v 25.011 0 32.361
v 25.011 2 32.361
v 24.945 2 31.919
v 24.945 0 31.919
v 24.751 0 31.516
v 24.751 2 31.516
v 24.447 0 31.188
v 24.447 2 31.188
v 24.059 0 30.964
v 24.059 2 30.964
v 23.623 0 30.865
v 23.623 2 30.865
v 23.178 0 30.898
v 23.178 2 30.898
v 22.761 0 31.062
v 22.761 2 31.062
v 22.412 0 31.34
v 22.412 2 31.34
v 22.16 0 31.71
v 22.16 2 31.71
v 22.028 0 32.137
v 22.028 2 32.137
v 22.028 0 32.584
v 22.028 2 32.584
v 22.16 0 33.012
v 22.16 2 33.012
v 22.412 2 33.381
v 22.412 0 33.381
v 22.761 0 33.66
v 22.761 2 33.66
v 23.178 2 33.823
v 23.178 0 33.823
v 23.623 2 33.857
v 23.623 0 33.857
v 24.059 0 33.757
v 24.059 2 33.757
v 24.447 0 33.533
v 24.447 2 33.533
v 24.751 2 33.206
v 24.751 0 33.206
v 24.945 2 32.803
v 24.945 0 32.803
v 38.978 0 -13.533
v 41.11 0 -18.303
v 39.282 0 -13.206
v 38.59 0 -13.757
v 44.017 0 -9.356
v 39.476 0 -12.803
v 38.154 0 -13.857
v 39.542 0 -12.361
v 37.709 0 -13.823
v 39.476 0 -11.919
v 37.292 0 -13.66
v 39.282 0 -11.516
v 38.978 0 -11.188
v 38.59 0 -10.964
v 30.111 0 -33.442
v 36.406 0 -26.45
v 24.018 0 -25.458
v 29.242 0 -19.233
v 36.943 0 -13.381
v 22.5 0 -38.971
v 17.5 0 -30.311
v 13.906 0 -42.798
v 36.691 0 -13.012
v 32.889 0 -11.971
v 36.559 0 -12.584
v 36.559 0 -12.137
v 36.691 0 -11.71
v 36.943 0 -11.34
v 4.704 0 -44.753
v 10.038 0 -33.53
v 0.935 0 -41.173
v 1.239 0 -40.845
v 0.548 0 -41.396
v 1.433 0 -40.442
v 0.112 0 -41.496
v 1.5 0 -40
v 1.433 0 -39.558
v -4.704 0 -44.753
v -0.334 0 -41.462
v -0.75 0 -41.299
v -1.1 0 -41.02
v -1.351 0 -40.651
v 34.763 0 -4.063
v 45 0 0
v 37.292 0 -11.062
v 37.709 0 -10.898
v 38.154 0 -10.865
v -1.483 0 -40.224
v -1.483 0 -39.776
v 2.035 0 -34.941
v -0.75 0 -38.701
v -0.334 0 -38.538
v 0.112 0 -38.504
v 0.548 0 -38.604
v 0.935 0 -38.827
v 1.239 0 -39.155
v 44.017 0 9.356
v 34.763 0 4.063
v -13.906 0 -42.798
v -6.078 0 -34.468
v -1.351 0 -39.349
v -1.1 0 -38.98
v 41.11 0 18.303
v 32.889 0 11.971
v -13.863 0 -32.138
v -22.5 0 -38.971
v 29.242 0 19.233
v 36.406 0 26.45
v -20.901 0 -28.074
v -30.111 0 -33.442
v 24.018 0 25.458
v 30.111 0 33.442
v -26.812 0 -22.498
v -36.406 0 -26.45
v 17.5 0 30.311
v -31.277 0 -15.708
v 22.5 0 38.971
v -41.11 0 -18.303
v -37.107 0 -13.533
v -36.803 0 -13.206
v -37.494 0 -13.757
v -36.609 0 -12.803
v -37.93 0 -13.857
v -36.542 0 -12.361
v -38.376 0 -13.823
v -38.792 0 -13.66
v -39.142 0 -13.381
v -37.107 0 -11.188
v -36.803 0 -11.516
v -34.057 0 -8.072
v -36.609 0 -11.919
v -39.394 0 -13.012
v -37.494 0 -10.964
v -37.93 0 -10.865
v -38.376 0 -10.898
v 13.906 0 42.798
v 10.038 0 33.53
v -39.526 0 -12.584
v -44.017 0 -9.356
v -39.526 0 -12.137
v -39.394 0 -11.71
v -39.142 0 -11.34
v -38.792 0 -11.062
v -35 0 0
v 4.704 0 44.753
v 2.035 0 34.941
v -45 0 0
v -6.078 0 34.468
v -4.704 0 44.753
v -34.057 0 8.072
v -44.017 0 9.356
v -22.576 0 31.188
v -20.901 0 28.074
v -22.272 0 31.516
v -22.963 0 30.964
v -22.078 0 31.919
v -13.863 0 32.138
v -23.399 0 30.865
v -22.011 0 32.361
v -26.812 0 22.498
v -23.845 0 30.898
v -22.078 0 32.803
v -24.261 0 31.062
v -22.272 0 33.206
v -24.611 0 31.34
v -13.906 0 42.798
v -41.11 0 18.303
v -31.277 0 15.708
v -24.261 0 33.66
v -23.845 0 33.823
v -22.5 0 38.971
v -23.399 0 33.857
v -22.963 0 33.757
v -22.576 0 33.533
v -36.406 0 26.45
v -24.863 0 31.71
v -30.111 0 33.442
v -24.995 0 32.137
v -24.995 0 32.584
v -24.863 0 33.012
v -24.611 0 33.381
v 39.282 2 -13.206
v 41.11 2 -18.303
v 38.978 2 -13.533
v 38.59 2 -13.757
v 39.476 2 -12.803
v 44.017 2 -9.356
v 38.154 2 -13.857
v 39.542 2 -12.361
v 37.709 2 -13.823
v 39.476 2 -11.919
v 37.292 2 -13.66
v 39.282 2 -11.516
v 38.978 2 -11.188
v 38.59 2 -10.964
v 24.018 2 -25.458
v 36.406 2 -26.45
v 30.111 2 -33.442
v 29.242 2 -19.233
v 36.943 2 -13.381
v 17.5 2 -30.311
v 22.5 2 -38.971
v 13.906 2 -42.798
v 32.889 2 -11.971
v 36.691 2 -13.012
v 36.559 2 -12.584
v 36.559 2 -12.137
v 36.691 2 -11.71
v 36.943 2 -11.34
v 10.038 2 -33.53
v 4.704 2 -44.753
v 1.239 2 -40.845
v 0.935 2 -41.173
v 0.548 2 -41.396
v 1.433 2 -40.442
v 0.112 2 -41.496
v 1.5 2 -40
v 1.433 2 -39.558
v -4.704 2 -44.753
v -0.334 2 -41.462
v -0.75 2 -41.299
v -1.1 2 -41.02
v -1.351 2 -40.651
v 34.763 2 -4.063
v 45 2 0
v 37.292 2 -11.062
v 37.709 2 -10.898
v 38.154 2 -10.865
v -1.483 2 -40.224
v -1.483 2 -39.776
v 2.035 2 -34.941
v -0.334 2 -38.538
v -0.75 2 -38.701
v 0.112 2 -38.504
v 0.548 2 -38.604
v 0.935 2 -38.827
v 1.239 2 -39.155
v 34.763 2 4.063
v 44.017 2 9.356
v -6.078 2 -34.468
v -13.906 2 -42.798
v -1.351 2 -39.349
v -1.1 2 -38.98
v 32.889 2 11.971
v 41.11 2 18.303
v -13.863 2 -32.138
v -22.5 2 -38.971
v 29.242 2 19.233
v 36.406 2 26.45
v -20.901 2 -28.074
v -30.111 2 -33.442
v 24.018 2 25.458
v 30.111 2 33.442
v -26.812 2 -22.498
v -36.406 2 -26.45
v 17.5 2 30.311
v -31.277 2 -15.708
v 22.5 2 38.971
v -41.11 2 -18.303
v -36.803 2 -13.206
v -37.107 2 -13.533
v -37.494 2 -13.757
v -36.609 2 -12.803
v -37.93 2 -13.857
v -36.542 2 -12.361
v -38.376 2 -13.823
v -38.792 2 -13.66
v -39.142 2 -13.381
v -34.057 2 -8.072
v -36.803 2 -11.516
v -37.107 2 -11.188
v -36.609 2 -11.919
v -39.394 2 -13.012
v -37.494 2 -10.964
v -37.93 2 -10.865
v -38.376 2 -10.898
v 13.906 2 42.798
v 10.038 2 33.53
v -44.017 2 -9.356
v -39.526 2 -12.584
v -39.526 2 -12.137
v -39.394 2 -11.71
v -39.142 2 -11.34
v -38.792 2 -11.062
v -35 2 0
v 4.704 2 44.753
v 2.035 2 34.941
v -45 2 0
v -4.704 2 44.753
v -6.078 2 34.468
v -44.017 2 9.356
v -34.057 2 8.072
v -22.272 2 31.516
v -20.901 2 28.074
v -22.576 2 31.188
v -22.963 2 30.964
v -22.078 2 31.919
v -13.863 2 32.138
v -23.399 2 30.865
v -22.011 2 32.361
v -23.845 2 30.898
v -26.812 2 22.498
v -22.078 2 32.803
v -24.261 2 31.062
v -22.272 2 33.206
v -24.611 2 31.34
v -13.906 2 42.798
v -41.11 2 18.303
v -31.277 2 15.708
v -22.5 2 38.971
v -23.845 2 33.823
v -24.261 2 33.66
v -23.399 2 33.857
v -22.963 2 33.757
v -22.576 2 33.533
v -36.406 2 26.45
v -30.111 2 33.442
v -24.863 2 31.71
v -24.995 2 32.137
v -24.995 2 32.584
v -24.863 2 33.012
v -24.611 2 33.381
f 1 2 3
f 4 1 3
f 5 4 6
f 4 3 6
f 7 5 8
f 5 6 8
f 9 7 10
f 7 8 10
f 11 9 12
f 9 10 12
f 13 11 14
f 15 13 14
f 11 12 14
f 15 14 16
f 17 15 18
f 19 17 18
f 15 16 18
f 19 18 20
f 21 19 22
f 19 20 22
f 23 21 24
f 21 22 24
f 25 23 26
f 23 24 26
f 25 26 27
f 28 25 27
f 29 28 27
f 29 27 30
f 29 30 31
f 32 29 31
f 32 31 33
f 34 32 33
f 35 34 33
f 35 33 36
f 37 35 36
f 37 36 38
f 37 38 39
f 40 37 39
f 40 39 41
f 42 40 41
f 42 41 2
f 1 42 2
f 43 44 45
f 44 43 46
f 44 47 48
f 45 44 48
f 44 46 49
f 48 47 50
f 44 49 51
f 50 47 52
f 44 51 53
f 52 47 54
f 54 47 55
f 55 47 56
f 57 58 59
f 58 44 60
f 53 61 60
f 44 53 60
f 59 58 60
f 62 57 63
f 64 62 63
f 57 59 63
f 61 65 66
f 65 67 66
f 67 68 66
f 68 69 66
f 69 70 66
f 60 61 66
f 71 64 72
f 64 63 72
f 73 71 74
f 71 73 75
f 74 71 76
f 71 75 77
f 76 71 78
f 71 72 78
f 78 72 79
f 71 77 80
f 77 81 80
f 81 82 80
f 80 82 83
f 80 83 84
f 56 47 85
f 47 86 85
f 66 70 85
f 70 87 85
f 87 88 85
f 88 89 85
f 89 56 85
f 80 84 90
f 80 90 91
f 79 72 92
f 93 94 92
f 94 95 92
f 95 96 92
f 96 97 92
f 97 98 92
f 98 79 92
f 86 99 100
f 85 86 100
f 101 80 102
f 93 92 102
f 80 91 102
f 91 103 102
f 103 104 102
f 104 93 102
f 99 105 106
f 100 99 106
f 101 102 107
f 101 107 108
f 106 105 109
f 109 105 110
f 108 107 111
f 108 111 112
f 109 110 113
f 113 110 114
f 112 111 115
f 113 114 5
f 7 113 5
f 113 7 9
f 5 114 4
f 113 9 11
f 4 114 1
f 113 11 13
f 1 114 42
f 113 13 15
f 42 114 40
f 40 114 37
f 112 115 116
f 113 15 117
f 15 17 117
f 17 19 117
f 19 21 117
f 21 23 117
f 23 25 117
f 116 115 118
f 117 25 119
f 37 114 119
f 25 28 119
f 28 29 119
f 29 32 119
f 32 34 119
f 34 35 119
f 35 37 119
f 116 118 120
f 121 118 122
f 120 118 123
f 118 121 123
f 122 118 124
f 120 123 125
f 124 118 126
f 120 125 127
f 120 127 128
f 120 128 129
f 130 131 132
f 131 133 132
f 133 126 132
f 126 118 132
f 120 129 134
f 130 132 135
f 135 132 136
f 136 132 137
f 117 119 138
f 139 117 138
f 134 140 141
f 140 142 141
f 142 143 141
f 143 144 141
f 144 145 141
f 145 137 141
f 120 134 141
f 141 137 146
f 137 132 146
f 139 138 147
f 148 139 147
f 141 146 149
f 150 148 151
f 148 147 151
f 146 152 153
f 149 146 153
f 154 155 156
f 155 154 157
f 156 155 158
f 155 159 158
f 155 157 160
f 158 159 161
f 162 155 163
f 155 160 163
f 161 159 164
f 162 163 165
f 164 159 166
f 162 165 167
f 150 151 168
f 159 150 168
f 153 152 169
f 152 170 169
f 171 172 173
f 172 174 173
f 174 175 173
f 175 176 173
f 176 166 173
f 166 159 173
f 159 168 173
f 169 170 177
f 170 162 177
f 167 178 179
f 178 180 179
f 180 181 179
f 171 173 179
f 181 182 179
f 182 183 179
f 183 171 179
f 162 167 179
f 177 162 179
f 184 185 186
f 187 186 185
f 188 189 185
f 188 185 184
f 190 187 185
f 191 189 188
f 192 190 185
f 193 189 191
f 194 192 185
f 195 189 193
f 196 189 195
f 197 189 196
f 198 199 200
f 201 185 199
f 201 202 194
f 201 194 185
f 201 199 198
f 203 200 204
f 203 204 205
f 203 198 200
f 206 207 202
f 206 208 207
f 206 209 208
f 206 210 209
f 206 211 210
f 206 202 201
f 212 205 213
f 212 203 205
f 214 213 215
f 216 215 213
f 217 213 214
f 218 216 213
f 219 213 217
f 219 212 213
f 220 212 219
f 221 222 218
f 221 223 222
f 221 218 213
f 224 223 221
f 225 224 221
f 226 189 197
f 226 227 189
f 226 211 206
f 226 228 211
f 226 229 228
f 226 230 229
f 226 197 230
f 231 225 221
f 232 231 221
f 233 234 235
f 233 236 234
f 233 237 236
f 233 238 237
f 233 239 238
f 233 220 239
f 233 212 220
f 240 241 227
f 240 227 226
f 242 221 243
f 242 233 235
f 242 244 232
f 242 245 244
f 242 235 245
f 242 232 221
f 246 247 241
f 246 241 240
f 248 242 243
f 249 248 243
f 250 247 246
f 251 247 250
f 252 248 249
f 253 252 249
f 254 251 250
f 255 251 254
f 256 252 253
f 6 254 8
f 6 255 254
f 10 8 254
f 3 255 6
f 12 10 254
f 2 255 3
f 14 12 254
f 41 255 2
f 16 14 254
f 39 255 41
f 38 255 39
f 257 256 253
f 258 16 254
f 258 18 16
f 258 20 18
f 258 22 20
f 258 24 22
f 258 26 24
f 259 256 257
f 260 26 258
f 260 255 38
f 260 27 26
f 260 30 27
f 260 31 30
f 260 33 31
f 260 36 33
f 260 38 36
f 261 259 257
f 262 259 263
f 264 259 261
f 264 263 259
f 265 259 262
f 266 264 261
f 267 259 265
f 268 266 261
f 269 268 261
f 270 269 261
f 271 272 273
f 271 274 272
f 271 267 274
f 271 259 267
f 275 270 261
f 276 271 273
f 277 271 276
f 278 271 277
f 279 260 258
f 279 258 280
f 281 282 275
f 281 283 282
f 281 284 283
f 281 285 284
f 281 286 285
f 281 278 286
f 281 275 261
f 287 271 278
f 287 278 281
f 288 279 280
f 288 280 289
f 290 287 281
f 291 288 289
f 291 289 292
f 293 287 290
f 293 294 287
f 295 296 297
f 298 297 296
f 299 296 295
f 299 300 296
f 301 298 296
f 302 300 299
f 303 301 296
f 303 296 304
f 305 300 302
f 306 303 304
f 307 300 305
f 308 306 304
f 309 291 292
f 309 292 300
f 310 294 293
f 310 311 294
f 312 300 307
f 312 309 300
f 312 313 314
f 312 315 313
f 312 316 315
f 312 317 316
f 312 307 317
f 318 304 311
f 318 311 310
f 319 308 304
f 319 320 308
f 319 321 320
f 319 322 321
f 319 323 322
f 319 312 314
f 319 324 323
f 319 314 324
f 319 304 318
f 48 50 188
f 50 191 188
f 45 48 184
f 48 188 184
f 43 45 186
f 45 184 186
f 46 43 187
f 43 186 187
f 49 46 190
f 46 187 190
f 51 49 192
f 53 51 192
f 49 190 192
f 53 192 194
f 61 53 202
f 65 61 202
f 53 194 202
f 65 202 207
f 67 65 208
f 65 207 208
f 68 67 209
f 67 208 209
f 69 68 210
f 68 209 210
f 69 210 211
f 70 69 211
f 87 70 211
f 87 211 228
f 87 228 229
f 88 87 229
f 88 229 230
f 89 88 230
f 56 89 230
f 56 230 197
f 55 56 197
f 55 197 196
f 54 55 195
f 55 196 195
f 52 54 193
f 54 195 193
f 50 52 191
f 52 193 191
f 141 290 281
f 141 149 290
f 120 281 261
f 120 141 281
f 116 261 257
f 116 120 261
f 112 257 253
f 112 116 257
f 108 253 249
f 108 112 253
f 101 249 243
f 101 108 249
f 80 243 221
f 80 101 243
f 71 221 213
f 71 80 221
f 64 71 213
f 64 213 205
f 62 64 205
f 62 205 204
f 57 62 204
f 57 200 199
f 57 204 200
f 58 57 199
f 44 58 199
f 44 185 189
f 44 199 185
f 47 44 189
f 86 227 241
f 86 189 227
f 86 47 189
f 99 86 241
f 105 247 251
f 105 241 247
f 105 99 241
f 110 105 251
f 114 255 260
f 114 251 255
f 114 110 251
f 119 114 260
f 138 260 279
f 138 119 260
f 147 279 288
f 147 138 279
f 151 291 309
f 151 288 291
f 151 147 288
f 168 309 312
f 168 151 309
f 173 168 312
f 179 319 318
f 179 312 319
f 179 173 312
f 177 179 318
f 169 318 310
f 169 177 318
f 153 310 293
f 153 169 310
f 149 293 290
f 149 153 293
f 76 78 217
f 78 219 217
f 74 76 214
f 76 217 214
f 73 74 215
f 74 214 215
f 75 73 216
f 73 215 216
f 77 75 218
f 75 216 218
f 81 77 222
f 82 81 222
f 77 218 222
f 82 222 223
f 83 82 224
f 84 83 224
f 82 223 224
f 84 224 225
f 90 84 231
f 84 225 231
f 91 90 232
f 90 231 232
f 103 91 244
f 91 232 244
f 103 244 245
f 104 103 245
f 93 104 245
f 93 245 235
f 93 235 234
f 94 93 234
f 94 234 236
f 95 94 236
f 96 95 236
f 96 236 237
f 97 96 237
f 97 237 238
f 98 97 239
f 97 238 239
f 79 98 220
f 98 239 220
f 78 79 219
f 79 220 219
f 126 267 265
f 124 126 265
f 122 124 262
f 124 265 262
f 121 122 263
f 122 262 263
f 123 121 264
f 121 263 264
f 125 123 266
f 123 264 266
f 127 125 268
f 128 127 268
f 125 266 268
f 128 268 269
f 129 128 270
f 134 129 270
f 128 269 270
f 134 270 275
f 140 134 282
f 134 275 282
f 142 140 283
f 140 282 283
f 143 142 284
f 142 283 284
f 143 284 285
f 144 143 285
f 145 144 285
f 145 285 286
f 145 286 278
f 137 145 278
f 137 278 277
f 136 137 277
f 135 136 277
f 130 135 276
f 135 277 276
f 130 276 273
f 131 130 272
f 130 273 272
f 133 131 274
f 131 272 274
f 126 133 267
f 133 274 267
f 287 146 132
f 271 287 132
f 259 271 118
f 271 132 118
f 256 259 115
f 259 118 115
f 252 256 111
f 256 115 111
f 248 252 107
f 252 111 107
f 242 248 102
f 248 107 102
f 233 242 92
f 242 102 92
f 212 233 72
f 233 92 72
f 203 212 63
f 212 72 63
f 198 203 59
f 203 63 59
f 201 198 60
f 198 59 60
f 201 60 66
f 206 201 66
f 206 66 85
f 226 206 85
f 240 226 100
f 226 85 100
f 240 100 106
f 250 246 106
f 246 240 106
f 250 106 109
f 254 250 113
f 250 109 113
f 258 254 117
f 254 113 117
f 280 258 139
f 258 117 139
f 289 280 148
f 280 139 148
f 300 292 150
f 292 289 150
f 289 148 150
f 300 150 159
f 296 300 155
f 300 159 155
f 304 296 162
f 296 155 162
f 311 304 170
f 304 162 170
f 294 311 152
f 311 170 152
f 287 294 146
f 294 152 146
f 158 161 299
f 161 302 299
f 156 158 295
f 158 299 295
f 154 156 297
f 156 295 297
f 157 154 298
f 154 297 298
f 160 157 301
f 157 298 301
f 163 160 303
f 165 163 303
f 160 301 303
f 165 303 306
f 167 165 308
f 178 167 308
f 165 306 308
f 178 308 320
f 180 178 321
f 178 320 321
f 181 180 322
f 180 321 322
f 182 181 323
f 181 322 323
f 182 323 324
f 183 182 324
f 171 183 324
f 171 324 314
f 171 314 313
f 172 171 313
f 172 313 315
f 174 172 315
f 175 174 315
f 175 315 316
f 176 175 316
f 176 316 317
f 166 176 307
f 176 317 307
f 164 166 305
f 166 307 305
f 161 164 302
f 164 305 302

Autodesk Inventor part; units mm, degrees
ref_plane "YZ Plane" through (0, 0, 0) normal (1, 0, 0) x (0, 1, 0)
ref_plane "XZ Plane" through (0, 0, 0) normal (0, 1, 0) x (-1, 0, 0)
ref_plane "XY Plane" through (0, 0, 0) normal (0, 0, 1) x (1, 0, 0)
sketch "Sketch1" plane through (0, 0, 0) normal (0, 1, 0) x (-1, 0, 0)
  circle A0 centre (0, 0) radius 45
  circle A1 centre (0, 0) radius 35
  dimension "d0" = 10
  dimension "d1" = 70
extrude "Extrusion1" add sketch "Sketch1" along normal blind 2
sketch "Sketch2" plane through (0, 2, 0) normal (0, 1, 0) x (1, 0, 0)
  circle A0 centre (0, 40) radius 1.5
  line L0 (0, 0) -> (0, 64.6181) construction
  circle A1 centre (-38.0423, 12.3607) radius 1.5
  line L1 (0, 0) -> (-61.4554, 19.9681) construction
  circle A2 centre (-23.5114, -32.3607) radius 1.5
  line L2 (0, 0) -> (-37.9816, -52.2771) construction
  circle A3 centre (23.5114, -32.3607) radius 1.5
  line L3 (0, 0) -> (37.9816, -52.2771) construction
  circle A4 centre (38.0423, 12.3607) radius 1.5
  line L4 (0, 0) -> (61.4554, 19.9681) construction
  dimension "d4" = 3
  dimension "d5" = 40
  dimension "d8" = 360
extrude "Extrusion2" cut sketch "Sketch2" against normal blind 3
properties part number "HeatingElementHolder01"
